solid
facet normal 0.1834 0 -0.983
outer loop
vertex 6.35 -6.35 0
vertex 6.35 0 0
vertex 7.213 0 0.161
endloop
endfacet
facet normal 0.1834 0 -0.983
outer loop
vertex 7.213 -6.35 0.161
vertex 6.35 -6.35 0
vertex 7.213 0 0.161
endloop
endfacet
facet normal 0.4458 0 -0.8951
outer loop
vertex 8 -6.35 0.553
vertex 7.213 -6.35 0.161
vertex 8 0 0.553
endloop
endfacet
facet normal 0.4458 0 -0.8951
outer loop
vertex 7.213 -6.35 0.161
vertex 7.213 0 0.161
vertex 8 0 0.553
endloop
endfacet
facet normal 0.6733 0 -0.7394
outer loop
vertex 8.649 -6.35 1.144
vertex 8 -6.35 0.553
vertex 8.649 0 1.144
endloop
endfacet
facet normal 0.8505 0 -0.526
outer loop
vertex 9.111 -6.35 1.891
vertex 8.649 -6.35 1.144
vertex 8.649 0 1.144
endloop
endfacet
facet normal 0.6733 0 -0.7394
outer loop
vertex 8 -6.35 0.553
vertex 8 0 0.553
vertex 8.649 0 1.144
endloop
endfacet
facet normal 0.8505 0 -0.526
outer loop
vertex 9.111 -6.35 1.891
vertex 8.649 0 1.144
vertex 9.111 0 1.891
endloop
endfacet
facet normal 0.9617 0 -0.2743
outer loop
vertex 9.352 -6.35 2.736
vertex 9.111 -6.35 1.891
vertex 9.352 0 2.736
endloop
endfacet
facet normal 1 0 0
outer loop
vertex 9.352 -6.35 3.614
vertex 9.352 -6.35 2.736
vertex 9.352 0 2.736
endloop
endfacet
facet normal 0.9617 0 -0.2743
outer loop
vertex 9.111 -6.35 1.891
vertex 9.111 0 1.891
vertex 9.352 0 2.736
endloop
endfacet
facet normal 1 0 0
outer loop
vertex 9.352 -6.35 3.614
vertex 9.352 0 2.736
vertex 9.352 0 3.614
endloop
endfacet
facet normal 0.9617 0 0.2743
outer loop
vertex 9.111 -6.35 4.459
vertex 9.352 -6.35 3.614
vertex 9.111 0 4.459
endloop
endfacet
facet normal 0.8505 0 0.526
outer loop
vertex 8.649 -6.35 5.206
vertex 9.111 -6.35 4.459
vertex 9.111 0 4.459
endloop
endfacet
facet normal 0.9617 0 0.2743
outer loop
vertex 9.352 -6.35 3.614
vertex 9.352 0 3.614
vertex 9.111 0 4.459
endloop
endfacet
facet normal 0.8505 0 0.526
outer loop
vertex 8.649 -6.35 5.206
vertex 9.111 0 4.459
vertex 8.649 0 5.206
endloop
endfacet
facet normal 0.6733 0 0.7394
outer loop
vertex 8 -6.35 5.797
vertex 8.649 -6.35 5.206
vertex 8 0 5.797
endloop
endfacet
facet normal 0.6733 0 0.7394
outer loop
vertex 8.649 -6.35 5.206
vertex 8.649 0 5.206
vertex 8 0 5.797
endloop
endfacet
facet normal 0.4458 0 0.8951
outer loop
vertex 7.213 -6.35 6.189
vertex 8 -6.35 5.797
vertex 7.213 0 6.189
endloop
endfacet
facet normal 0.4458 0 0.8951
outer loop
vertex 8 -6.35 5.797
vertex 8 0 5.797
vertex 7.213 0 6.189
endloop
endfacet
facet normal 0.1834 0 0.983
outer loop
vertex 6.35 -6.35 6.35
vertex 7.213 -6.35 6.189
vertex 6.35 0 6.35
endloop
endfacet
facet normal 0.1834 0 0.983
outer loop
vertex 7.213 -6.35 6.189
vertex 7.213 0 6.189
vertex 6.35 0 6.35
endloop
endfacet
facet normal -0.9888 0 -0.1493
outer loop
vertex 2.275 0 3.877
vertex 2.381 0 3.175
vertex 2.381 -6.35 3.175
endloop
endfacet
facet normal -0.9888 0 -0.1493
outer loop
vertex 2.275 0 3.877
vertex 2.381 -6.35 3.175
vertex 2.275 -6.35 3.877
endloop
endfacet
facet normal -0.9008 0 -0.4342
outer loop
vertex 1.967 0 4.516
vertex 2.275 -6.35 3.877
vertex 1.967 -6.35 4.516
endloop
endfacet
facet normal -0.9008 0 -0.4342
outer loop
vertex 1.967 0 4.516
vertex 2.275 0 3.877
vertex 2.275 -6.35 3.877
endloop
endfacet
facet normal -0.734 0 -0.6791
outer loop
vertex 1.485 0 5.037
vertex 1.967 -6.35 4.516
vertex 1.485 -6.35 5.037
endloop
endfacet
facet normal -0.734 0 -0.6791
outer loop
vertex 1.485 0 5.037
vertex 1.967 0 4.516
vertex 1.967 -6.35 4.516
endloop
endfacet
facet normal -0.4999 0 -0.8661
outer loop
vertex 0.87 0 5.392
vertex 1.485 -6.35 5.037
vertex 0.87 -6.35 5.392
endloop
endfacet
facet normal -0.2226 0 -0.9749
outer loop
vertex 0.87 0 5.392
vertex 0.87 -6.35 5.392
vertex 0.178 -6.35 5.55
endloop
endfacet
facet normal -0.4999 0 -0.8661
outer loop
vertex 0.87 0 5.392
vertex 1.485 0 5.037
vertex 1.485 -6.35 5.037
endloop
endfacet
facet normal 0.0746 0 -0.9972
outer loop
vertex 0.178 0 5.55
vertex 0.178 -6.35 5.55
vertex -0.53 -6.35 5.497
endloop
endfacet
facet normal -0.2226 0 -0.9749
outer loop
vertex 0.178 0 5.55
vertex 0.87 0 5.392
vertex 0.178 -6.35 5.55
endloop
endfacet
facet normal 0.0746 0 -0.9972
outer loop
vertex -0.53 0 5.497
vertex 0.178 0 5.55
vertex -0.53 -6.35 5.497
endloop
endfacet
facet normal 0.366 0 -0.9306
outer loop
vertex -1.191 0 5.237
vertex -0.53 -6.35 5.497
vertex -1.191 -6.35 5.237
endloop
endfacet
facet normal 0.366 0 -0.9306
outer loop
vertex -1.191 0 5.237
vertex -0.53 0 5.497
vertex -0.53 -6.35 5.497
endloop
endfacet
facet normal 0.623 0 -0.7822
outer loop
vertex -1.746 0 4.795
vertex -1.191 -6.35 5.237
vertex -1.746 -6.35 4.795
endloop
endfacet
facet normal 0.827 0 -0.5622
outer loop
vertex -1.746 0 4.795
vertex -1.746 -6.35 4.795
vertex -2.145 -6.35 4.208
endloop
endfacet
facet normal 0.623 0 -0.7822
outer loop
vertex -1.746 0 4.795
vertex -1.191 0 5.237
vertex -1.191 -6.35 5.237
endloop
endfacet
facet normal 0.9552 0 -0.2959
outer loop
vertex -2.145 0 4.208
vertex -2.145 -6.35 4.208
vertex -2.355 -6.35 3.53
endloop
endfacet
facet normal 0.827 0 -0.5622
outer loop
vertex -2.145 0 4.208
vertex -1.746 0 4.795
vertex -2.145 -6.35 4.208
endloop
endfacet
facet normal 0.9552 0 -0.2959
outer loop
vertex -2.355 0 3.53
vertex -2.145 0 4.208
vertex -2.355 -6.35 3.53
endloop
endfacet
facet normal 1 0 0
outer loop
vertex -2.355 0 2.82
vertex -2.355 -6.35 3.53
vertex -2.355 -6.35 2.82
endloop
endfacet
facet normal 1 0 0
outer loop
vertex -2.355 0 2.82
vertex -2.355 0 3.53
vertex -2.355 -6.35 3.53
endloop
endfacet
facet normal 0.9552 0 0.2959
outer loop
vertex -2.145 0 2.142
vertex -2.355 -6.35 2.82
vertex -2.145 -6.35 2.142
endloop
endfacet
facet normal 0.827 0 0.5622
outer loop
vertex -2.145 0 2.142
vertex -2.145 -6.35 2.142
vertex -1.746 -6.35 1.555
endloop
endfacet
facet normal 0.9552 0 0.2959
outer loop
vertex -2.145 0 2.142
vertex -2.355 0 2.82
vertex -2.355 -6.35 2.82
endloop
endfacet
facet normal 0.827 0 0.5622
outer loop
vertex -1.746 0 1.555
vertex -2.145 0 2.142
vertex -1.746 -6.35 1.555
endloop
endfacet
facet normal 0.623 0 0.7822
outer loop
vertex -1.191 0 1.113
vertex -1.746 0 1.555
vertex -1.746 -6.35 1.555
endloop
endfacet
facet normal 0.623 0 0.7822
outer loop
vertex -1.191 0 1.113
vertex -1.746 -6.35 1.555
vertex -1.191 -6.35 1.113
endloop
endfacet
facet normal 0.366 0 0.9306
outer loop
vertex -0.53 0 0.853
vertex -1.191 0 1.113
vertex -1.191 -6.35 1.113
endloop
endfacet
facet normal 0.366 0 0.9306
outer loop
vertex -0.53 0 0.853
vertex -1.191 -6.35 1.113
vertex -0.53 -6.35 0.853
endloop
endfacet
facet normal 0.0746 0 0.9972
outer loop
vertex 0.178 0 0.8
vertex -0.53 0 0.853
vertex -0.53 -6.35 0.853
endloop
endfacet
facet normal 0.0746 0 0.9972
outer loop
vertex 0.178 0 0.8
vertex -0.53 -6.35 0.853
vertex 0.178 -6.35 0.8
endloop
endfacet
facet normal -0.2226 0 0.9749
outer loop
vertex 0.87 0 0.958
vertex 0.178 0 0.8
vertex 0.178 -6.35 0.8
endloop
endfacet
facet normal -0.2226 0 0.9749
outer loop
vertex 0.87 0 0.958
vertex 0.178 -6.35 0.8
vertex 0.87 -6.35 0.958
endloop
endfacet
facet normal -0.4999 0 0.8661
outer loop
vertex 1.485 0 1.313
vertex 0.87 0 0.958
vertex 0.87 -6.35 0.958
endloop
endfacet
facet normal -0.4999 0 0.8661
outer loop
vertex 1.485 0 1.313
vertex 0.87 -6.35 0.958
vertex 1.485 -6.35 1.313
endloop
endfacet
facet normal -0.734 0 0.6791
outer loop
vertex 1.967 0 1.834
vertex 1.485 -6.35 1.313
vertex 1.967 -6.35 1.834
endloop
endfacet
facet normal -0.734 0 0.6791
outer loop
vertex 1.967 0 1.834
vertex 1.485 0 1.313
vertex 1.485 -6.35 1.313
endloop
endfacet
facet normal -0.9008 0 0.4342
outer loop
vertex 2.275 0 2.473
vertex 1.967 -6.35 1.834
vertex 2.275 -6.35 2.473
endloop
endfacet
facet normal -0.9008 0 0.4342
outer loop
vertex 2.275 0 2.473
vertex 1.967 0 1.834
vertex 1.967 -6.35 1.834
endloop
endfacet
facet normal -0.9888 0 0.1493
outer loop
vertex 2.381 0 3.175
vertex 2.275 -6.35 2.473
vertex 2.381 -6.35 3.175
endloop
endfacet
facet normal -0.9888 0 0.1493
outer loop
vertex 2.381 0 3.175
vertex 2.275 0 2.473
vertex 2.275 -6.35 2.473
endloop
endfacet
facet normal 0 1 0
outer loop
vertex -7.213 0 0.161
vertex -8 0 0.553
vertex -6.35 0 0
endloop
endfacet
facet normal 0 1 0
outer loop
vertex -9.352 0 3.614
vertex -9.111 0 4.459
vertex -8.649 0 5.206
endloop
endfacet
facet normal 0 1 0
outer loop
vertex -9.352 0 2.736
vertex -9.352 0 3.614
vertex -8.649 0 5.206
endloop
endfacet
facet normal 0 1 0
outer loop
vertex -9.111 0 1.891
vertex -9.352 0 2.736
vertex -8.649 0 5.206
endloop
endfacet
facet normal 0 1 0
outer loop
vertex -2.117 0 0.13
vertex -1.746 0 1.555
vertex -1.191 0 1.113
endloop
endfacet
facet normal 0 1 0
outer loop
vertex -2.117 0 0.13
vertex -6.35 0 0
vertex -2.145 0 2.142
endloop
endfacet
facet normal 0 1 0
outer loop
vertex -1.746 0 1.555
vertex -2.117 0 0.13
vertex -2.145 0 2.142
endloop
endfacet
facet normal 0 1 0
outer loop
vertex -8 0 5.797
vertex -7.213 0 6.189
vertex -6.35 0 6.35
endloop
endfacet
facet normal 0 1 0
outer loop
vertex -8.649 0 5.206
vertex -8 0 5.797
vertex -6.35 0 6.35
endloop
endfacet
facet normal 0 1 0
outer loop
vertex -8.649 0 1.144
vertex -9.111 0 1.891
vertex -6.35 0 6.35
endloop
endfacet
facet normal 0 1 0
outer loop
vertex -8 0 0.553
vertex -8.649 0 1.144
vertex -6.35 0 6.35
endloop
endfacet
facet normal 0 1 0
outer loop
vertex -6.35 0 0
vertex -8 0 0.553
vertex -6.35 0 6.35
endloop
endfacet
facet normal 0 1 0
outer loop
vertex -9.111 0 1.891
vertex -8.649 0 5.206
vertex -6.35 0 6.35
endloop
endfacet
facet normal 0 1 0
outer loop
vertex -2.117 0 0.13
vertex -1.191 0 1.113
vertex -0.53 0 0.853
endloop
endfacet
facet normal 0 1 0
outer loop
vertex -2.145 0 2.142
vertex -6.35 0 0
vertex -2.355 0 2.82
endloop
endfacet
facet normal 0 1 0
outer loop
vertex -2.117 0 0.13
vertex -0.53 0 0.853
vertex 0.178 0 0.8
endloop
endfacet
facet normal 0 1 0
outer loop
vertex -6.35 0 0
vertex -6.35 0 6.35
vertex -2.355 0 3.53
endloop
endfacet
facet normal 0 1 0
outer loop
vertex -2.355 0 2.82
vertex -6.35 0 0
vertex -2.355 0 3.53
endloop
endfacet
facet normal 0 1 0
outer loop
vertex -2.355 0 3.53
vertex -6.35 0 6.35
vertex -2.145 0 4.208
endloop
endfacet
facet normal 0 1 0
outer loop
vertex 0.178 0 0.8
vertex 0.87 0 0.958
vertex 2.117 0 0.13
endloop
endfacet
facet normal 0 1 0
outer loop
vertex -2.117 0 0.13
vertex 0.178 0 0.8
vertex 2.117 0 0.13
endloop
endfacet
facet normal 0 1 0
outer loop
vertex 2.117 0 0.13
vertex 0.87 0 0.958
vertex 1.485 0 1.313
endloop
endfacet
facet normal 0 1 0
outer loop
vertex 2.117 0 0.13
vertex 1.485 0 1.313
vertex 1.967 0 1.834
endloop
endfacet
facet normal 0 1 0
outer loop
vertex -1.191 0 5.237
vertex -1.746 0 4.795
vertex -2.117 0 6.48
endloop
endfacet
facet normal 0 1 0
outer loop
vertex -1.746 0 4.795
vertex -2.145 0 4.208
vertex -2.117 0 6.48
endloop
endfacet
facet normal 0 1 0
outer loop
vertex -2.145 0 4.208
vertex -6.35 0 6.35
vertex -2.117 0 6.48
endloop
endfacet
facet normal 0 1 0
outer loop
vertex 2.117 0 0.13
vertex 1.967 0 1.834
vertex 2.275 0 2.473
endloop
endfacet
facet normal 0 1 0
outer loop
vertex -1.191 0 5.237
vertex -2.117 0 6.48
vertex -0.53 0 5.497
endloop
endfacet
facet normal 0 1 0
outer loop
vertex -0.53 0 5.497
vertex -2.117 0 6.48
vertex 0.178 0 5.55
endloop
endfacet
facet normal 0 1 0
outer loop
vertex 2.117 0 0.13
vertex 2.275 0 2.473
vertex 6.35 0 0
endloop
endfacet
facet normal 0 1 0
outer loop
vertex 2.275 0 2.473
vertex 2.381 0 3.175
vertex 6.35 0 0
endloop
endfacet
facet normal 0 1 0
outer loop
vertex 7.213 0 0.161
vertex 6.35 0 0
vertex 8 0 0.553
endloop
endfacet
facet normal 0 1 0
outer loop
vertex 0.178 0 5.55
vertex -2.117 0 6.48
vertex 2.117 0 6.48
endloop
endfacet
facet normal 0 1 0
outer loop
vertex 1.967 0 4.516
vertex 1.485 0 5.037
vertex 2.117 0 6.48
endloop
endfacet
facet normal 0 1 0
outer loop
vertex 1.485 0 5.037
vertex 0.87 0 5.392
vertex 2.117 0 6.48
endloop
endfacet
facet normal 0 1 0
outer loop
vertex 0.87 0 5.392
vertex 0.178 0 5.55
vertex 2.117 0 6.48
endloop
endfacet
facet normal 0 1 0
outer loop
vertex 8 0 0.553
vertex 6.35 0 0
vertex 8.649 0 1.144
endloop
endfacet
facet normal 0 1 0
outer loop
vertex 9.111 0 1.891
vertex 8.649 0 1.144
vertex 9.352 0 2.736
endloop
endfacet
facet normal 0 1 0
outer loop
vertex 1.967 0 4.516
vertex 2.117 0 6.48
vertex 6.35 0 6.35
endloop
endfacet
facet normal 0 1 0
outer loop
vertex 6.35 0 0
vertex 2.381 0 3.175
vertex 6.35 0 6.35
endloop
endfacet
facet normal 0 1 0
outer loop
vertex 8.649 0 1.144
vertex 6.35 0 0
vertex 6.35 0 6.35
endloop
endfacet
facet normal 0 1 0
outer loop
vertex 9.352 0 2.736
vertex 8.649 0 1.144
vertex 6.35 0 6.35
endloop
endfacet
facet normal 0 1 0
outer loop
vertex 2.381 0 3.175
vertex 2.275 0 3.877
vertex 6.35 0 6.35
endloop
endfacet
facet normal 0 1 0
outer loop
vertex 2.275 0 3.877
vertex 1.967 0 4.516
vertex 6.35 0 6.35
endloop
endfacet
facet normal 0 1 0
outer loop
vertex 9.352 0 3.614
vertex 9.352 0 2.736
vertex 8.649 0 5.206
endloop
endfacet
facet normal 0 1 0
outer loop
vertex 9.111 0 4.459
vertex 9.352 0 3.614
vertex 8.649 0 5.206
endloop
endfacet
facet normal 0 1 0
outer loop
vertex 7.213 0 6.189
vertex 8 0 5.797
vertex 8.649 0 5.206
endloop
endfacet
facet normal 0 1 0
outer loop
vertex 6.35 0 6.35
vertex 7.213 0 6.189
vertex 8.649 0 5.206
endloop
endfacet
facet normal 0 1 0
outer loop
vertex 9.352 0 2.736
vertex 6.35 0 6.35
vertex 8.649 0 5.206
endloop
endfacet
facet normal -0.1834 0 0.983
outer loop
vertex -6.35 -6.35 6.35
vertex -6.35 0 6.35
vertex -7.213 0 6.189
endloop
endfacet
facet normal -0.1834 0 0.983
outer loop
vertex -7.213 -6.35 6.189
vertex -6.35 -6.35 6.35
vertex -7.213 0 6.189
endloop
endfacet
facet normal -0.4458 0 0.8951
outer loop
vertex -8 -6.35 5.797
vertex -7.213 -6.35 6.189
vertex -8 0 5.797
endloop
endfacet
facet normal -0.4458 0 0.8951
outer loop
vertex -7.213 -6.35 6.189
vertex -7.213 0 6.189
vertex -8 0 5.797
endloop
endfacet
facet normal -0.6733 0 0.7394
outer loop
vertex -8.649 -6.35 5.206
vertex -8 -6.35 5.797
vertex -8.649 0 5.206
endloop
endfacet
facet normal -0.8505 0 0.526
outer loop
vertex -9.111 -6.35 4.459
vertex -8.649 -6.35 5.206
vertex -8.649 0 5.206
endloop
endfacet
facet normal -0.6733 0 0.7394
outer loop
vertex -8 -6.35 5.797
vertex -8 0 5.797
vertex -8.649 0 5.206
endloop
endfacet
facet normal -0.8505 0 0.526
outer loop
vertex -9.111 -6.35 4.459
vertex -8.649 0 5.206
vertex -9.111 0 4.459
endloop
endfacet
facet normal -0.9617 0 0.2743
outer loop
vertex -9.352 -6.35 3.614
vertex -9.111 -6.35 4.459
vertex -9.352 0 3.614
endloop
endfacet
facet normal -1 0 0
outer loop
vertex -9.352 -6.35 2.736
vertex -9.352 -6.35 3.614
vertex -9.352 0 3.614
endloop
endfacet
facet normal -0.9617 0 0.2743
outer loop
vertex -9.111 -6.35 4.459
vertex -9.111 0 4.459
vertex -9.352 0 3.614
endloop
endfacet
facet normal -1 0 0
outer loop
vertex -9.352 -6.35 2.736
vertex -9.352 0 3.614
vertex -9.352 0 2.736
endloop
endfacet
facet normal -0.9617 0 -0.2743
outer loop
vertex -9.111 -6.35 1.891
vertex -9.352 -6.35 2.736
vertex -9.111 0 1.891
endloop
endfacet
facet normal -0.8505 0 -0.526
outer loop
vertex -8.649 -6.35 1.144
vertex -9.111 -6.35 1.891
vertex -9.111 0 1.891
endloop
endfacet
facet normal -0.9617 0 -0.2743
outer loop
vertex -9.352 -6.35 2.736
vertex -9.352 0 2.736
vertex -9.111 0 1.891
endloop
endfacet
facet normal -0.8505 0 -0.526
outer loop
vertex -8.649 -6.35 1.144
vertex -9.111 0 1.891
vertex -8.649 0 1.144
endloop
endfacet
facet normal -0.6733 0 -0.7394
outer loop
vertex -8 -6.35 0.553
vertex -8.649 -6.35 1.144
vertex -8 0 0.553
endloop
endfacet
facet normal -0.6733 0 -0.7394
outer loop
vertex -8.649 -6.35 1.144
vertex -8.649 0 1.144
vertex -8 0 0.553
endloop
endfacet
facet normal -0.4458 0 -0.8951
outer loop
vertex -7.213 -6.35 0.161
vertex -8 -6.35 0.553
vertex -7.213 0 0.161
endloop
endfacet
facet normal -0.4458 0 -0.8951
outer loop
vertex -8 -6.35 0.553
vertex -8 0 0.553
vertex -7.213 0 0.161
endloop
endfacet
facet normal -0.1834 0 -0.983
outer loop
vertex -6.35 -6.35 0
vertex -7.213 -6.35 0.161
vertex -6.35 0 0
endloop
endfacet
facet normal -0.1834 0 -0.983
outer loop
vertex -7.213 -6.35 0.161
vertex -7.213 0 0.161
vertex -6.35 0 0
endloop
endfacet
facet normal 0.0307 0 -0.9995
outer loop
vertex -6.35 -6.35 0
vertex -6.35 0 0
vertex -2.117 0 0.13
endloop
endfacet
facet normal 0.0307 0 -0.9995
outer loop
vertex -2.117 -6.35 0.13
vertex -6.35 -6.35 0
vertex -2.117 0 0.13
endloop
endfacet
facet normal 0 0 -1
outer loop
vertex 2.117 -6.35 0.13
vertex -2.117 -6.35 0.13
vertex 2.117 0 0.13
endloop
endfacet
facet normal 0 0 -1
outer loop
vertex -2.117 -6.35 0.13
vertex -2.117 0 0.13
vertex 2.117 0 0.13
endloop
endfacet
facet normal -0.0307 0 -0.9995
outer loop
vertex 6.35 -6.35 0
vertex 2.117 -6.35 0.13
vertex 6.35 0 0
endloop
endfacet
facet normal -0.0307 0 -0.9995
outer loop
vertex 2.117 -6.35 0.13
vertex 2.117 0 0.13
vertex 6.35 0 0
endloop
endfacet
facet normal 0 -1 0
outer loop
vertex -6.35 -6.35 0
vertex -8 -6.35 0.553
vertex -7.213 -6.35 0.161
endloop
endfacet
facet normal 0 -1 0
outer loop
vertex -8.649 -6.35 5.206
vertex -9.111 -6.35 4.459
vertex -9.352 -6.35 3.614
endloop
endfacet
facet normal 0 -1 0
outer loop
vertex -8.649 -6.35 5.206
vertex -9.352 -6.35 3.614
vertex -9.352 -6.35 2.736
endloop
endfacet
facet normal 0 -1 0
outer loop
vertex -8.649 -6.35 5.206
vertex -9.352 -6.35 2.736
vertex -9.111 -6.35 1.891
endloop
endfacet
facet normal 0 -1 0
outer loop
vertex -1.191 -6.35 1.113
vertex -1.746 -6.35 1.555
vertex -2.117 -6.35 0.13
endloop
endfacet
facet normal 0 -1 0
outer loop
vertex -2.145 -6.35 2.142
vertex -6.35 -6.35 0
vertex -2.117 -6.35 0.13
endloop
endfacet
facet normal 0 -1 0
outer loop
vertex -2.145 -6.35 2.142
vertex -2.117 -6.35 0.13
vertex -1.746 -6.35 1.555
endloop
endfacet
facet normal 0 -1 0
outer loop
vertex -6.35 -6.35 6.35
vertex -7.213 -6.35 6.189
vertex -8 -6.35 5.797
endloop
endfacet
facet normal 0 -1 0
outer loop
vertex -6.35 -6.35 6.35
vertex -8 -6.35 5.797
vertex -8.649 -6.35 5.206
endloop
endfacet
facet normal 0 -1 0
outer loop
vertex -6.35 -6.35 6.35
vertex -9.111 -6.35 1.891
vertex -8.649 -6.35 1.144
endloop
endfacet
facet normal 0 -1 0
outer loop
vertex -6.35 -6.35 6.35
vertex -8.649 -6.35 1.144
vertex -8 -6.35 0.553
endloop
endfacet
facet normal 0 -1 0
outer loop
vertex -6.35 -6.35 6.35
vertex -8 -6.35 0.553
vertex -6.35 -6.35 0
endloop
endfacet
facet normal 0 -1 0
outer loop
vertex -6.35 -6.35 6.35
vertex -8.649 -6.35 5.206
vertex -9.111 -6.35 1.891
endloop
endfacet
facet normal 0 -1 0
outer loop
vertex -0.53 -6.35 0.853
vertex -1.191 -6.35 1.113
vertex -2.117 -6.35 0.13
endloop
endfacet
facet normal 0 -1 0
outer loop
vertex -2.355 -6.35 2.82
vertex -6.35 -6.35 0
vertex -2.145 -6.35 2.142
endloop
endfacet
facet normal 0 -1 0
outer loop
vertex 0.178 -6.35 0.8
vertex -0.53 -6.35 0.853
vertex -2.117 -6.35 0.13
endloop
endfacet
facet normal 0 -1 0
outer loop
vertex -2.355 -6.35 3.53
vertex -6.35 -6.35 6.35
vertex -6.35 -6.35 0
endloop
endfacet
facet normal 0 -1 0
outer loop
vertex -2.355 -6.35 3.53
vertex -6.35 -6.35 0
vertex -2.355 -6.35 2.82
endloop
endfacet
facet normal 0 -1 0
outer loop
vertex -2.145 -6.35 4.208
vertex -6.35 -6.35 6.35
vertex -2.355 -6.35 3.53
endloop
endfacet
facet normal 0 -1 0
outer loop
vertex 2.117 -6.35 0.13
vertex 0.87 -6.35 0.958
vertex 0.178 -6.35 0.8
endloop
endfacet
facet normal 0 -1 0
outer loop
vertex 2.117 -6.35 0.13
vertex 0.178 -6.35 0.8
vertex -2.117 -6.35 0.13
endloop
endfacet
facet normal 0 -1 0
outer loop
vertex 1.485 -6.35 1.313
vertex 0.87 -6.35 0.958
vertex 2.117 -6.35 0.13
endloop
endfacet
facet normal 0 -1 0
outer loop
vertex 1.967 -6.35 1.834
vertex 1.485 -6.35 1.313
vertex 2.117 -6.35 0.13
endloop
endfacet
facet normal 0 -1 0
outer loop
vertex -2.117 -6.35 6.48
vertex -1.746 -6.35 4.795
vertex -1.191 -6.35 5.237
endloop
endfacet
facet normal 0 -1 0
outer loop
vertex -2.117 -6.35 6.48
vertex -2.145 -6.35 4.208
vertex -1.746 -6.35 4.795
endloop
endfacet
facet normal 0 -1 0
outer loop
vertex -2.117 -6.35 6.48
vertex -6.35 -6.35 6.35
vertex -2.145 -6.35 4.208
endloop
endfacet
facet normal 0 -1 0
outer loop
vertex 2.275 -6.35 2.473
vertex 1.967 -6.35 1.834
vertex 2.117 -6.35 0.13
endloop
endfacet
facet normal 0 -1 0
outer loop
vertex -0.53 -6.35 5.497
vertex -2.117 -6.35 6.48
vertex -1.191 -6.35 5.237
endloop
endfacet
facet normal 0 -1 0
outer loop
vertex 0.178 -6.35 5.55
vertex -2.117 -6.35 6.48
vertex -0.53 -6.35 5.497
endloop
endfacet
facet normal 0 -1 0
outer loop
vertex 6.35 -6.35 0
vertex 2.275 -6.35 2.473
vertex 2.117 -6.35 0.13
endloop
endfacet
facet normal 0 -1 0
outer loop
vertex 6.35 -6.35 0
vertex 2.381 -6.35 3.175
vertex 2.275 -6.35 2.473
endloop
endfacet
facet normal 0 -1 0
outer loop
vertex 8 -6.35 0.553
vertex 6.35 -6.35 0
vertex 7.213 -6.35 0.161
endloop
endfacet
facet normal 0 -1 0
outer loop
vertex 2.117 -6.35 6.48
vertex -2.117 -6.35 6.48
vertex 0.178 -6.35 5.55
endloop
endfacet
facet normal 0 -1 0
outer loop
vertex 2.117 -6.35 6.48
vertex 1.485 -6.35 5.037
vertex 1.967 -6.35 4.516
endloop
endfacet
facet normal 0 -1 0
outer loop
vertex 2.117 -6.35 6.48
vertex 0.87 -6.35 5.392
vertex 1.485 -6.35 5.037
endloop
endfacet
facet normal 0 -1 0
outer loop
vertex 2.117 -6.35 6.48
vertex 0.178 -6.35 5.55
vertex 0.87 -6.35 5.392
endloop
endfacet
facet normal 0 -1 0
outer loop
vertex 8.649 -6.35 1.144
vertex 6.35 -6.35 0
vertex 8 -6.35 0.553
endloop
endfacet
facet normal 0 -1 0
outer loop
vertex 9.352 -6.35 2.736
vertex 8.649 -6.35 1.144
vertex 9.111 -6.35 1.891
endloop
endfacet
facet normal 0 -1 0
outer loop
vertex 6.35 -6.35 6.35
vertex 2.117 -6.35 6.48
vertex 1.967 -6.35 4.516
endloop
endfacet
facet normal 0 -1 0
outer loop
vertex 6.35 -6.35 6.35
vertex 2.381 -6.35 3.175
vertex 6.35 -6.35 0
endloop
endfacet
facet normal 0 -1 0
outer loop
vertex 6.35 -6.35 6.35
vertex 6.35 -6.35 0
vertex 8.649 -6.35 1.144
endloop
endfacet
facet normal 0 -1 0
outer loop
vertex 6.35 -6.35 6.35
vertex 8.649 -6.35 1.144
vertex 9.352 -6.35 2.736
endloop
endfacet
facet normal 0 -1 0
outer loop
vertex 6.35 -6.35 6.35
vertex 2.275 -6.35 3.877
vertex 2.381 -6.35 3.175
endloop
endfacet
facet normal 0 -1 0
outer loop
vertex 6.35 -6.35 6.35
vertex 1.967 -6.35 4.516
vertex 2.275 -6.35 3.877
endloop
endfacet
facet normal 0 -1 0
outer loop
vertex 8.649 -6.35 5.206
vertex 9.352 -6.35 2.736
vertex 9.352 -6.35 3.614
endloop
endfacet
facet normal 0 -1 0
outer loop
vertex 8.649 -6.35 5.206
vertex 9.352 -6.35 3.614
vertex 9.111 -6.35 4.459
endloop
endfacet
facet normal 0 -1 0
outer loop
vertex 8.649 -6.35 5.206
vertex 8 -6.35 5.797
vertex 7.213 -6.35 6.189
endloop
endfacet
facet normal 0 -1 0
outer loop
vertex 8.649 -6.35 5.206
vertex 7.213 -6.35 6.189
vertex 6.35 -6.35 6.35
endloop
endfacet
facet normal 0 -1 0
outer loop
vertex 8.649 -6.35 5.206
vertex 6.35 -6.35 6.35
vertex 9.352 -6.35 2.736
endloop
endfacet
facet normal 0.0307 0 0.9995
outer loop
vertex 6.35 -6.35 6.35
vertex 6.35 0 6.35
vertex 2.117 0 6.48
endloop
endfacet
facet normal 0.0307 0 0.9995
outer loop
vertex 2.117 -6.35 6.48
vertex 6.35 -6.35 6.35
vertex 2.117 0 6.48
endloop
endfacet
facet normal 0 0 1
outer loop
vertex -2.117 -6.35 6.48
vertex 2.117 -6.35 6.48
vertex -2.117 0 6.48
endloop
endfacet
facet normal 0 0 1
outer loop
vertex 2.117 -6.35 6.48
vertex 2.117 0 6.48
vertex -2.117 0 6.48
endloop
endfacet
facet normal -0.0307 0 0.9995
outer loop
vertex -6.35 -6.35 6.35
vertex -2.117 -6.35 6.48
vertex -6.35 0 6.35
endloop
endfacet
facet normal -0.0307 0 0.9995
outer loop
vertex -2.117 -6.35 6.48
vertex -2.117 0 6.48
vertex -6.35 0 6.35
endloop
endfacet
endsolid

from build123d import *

# Parameters (mm, degrees)
F0_R     = 2.38125
F1_DEPTH = 6.35


with BuildPart() as f1:
    # F0 (on Front) → F1 (new body)
    with BuildSketch(Plane.XZ):
        with BuildLine():
            ThreePointArc((-6.35, 0), (0, 0.146256), (6.35, 0))
            ThreePointArc((6.35, 0), (9.382037, 3.175), (6.35, 6.35))
            ThreePointArc((6.35, 6.35), (0, 6.496256), (-6.35, 6.35))
            ThreePointArc((-6.35, 6.35), (-9.382037, 3.175), (-6.35, 0))
        make_face()
        with Locations((0, 3.175)):
            Circle(F0_R, mode=Mode.SUBTRACT)
    extrude(amount=F1_DEPTH)


solid = f1.part
